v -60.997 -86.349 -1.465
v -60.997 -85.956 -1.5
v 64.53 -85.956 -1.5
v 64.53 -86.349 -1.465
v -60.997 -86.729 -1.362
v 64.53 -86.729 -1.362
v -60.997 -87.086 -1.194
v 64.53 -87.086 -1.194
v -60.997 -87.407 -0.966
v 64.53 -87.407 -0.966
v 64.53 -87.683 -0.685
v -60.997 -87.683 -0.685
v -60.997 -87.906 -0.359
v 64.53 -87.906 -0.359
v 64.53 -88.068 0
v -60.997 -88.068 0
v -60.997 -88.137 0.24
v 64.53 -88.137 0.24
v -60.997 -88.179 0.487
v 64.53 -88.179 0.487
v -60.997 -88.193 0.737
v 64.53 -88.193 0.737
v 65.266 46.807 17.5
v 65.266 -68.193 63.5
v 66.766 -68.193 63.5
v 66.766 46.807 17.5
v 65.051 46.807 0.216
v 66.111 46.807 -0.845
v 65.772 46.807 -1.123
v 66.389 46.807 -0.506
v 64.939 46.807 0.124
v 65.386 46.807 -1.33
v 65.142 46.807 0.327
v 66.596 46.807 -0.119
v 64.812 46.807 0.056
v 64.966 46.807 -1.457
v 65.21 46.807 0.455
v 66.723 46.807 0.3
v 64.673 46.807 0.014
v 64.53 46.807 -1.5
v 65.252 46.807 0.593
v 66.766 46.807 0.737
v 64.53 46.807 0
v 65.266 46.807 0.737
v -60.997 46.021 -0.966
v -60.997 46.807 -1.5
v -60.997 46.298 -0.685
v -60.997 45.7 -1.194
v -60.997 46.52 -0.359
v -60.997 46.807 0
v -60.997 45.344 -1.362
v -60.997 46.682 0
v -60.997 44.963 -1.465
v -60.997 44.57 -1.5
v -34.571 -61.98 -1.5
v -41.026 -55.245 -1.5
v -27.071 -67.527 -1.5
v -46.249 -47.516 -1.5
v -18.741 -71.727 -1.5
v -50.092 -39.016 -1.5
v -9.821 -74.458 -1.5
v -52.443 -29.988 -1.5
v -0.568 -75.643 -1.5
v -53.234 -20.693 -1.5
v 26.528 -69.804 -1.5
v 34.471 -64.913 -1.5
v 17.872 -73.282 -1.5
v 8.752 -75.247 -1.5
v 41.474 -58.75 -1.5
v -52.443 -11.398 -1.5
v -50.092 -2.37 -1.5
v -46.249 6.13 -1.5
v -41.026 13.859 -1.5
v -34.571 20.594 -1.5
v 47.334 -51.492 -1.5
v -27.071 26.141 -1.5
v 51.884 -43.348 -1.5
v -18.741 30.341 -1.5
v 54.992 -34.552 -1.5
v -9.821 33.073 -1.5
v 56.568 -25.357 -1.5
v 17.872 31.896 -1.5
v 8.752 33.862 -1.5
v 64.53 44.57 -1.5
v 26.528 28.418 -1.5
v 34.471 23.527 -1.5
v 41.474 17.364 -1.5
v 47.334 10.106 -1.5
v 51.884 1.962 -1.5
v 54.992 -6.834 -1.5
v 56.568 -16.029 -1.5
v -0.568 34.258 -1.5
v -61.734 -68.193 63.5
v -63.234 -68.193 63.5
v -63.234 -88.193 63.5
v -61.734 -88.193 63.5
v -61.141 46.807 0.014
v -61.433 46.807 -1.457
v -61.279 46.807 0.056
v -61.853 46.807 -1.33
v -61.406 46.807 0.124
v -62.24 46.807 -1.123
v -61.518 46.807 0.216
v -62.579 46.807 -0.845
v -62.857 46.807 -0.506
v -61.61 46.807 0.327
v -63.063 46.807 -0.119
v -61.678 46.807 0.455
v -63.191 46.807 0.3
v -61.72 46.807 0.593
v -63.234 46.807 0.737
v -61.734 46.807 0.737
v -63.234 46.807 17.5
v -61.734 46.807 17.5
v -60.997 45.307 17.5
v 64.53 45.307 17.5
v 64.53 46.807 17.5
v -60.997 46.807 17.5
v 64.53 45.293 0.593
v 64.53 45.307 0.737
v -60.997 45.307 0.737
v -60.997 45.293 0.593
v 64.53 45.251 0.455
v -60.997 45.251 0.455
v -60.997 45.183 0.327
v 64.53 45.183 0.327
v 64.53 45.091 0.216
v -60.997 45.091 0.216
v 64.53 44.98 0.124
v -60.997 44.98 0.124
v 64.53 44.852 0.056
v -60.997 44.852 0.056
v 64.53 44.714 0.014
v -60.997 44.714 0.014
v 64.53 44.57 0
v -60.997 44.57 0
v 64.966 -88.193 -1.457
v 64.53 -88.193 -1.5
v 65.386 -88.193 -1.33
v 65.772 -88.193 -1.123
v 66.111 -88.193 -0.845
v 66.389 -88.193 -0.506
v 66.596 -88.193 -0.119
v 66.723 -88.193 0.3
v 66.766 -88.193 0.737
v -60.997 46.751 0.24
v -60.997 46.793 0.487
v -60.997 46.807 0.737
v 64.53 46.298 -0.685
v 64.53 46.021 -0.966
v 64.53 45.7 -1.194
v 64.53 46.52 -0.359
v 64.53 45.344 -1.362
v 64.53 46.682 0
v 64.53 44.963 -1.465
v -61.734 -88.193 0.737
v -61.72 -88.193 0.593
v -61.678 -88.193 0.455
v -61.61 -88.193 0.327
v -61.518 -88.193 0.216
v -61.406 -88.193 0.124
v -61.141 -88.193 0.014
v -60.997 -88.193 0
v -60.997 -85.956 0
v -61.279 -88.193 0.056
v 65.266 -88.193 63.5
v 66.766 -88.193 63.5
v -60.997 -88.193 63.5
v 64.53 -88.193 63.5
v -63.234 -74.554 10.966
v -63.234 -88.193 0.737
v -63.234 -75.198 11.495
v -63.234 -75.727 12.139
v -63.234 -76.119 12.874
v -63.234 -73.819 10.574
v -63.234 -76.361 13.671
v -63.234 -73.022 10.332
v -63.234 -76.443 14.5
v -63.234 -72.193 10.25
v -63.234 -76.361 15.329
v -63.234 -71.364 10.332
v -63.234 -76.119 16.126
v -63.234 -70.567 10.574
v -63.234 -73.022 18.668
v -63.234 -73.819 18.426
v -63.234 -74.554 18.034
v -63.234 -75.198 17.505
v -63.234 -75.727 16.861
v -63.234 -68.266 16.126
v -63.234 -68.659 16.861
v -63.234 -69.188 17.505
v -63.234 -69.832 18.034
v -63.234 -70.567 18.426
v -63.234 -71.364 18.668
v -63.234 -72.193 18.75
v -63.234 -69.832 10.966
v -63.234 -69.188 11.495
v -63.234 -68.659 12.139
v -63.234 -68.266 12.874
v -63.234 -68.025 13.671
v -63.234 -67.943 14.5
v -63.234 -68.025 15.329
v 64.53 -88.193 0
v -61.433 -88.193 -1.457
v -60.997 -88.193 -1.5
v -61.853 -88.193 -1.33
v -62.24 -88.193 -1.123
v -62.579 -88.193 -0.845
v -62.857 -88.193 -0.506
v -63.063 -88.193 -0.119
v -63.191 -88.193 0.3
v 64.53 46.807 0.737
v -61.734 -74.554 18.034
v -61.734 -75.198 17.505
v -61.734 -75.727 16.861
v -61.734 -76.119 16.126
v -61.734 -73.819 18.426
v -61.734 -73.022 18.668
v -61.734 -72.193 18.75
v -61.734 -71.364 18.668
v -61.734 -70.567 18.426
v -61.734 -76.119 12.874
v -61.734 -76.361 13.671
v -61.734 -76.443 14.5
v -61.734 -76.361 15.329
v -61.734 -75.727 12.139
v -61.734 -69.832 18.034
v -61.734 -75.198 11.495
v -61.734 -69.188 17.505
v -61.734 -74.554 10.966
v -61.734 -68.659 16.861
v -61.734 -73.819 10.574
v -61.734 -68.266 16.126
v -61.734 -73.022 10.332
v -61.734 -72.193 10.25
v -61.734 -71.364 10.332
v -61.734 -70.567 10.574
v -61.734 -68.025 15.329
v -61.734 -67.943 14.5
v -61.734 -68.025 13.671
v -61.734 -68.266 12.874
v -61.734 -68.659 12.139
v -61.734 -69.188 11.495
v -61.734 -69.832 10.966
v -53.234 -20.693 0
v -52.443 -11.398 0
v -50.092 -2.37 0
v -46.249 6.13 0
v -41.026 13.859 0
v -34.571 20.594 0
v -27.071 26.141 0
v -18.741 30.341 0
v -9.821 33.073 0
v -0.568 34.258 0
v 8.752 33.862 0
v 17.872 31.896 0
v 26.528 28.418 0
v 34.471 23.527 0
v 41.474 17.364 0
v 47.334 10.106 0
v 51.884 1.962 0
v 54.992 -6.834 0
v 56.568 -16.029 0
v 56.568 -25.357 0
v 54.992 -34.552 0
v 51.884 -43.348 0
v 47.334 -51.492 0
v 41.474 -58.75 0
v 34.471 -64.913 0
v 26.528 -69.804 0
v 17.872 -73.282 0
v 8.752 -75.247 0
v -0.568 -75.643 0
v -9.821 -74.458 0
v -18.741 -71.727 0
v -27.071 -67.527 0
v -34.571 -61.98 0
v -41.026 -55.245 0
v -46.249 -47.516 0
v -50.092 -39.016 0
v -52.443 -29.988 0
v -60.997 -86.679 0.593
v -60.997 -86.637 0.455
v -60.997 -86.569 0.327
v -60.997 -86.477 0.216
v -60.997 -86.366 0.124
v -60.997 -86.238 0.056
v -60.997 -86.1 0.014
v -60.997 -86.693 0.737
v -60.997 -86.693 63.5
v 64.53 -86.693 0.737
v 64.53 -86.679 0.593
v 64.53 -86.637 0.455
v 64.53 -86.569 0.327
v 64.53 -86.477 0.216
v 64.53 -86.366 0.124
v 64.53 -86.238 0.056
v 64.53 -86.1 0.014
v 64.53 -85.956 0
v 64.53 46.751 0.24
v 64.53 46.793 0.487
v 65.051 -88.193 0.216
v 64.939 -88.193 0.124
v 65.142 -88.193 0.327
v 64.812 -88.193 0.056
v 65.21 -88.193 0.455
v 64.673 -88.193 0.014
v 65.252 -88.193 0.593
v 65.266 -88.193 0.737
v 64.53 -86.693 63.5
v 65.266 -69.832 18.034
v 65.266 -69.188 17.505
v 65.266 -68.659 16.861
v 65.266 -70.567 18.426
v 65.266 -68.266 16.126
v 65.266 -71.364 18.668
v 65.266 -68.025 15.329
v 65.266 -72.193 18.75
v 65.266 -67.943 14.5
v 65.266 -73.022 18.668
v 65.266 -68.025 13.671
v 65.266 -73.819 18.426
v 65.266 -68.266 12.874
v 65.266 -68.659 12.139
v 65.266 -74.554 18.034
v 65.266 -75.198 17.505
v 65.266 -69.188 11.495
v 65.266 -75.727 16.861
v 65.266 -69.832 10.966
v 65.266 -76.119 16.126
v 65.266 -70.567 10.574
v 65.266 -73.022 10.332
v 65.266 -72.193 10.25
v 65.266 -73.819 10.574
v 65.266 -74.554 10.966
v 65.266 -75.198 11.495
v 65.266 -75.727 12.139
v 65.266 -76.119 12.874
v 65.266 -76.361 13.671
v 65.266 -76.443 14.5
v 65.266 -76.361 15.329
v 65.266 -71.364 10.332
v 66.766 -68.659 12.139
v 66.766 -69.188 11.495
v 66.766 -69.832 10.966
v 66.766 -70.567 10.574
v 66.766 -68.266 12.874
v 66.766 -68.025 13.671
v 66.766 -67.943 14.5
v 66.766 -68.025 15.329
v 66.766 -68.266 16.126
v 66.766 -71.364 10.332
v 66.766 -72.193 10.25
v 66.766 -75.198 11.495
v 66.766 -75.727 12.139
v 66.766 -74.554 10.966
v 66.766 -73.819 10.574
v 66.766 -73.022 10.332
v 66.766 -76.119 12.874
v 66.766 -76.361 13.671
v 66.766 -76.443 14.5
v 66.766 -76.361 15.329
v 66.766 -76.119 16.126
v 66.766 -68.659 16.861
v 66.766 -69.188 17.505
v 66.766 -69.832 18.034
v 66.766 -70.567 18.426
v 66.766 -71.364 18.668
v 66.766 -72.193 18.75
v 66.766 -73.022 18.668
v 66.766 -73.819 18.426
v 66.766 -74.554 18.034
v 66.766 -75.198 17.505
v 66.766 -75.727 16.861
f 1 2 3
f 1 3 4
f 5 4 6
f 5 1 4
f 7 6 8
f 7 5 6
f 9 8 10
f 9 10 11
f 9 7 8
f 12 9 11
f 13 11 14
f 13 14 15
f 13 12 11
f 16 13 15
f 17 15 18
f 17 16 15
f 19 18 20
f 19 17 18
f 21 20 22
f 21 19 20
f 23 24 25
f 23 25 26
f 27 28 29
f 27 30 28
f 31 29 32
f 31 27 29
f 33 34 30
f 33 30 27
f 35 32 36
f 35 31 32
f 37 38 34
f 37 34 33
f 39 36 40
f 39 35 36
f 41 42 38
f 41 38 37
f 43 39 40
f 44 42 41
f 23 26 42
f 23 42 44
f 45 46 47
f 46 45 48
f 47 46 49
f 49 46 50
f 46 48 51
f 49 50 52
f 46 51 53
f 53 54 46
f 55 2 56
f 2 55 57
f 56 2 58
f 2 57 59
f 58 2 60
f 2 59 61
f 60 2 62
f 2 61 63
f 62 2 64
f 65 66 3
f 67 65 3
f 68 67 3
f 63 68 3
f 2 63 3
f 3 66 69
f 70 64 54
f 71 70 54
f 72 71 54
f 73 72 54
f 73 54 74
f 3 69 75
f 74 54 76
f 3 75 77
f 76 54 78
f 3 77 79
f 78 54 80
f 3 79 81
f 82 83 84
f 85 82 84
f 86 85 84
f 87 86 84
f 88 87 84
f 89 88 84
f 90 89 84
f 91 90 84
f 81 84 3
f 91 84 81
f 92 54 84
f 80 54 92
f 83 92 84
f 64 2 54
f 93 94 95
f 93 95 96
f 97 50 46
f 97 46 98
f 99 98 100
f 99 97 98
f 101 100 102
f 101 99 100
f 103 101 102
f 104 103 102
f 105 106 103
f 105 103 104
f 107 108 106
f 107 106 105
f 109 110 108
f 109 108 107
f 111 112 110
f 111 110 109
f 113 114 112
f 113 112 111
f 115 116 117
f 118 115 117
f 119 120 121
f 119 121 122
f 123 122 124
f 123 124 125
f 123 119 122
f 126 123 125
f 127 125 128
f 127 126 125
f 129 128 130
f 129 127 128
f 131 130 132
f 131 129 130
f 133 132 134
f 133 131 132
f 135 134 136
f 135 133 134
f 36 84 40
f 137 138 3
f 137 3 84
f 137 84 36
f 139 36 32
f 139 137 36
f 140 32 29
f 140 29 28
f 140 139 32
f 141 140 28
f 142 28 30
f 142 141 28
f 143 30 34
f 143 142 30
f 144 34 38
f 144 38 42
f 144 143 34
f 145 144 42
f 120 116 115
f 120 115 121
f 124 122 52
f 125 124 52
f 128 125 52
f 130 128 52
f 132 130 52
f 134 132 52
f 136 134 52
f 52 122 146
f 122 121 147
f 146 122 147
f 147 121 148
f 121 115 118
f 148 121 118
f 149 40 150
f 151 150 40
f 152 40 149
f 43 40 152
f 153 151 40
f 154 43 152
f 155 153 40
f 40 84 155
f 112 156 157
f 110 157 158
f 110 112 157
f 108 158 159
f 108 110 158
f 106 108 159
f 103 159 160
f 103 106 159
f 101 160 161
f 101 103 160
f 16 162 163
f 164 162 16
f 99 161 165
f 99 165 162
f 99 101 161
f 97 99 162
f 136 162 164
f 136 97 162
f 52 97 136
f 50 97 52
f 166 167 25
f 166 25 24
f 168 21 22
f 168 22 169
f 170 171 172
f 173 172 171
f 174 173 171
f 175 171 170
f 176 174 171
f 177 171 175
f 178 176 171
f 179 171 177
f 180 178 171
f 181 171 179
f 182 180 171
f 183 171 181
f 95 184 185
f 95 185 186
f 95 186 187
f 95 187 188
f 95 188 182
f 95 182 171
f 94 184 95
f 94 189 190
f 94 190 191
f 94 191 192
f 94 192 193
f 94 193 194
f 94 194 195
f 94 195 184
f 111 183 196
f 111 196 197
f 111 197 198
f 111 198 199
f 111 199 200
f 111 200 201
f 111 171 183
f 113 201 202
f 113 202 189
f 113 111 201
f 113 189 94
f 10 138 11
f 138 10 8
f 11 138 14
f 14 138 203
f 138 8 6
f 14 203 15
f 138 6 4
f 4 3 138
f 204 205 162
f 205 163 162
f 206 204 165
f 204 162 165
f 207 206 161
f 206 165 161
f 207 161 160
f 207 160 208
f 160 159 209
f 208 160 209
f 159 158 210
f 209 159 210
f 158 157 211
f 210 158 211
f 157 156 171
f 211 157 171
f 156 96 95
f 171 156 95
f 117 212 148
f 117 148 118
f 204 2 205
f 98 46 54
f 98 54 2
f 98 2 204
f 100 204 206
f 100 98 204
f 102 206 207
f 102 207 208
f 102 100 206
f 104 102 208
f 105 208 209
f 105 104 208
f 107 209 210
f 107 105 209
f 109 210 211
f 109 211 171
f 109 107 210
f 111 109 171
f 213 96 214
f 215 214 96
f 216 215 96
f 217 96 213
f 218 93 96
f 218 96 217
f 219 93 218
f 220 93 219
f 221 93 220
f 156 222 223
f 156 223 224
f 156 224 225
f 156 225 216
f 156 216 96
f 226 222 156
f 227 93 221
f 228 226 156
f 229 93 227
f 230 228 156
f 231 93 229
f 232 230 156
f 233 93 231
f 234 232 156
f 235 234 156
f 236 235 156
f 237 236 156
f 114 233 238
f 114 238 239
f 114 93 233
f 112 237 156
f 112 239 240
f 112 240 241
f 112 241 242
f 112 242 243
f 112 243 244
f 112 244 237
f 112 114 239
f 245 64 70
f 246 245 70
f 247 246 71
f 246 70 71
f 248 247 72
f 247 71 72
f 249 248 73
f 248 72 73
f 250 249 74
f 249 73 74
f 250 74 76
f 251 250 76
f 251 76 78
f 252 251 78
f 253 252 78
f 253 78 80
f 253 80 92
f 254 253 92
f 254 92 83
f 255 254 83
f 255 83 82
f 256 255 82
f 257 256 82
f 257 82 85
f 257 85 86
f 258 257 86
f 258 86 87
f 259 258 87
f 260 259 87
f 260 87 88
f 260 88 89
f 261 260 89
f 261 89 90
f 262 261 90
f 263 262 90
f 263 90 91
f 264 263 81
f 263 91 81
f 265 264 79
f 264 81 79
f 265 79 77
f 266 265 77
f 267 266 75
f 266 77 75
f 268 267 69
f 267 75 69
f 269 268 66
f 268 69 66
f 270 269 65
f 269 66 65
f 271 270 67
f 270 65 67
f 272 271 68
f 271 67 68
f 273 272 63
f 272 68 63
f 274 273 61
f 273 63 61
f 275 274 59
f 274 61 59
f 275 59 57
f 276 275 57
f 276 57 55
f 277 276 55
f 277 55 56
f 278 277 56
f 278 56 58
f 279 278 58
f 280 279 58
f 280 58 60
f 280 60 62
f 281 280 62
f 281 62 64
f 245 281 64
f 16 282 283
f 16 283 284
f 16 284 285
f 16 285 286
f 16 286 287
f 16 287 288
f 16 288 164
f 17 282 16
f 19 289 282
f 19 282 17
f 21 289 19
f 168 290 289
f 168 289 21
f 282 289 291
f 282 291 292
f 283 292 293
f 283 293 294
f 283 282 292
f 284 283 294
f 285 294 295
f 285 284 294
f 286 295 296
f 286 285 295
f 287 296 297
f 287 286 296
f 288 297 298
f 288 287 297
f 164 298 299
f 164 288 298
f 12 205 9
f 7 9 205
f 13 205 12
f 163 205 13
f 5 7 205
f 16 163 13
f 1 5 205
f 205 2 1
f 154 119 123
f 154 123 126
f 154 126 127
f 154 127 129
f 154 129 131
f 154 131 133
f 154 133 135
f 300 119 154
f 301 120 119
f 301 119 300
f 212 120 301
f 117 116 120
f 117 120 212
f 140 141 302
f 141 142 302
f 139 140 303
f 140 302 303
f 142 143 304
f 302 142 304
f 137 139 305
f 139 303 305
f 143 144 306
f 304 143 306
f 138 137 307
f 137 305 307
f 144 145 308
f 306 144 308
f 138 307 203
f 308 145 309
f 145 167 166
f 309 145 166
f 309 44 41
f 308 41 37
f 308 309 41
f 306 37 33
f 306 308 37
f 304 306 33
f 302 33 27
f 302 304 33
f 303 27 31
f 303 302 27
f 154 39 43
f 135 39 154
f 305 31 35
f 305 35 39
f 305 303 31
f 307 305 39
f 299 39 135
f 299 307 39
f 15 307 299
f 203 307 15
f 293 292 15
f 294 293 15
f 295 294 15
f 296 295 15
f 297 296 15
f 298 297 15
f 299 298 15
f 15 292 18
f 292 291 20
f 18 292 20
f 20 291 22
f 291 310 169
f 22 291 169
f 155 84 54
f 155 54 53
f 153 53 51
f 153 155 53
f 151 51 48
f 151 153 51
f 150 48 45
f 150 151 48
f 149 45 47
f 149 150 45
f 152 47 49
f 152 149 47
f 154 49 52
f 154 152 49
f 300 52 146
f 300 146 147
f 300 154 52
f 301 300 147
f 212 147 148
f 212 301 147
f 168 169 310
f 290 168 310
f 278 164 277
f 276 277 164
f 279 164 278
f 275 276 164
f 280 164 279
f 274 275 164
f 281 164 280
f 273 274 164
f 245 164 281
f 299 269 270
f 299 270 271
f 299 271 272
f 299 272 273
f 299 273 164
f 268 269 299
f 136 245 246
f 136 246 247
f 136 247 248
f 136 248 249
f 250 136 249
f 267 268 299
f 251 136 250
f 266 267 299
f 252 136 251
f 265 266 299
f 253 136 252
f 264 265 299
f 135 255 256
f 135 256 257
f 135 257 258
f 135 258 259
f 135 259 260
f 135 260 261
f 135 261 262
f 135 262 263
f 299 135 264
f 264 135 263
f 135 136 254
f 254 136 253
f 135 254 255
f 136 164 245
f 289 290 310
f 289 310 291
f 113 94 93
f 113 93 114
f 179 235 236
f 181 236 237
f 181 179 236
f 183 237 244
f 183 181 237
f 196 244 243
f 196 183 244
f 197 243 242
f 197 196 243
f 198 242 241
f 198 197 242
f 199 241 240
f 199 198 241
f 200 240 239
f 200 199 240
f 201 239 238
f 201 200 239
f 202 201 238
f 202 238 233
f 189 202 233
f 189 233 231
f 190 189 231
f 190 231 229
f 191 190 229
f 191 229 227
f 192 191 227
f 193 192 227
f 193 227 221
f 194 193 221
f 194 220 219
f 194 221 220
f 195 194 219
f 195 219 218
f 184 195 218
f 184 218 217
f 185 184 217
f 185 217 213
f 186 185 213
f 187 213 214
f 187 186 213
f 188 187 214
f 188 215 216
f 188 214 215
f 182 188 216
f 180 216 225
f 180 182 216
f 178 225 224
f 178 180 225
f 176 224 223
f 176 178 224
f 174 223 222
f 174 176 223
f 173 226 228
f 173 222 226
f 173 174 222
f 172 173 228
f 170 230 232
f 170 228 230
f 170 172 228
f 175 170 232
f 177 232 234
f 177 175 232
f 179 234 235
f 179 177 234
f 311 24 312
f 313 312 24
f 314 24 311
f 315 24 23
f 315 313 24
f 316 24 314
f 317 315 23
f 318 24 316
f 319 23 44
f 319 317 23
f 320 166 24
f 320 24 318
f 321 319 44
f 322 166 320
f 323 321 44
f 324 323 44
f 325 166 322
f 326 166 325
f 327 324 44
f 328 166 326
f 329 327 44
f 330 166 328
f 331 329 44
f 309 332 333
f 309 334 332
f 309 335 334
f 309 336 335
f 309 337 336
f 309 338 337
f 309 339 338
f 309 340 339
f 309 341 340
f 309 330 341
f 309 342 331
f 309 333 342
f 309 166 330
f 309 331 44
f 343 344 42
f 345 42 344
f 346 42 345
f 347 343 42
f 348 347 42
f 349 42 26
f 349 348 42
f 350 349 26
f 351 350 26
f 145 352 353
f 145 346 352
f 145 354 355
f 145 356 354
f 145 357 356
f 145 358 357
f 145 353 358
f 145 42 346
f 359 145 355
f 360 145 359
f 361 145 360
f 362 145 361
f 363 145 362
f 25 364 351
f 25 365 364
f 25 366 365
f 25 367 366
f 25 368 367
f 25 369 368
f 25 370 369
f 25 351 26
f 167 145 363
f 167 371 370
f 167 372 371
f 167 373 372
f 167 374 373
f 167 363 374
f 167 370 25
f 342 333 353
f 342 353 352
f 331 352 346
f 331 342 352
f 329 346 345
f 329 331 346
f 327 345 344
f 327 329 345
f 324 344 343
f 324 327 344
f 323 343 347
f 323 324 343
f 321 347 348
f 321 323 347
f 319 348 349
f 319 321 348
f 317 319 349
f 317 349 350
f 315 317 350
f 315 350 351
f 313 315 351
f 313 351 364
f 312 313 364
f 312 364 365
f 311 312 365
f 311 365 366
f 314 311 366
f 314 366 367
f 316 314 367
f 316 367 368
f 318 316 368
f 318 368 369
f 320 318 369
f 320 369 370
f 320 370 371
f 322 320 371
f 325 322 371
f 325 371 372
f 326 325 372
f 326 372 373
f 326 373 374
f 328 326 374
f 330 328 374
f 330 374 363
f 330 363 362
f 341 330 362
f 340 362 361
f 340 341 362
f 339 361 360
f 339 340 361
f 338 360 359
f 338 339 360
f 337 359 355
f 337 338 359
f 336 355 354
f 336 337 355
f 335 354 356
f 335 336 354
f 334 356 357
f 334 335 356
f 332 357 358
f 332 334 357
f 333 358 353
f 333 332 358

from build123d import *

# Parameters (mm, degrees)
SKETCH1_W                    = 130
SKETCH1_H                    = 135
BASE_FLANGE2_DEPTH           = 1.5
EDGE_FLANGE5_STRIP_W         = 7.4732
EDGE_FLANGE5_STRIP_H         = 1.5
EDGE_FLANGE5_STRIP_CUT_DEPTH = 135
EDGE_FLANGE5_DEPTH           = 135
EDGE_FLANGE6_STRIP_W         = 7.4732
EDGE_FLANGE6_STRIP_H         = 1.5
EDGE_FLANGE6_STRIP_CUT_DEPTH = 135
EDGE_FLANGE6_DEPTH           = 135
EDGE_FLANGE7_STRIP_W         = 7.4732
EDGE_FLANGE7_STRIP_H         = 1.5
EDGE_FLANGE7_STRIP_CUT_DEPTH = 125.5268
EDGE_FLANGE7_DEPTH           = 125.5268
CUT_EXTRUDE1_START           = -130
CUT_EXTRUDE1_OUTLINE_R       = 4.25
CUT_EXTRUDE1_DEPTH           = 130
CUT_EXTRUDE1_START_2         = -127.7634
CUT_EXTRUDE1_2_DEPTH         = 125.5268
SKETCH39_R                   = 55
CUT_EXTRUDE2_DEPTH           = 10
EDGE_FLANGE8_STRIP_W         = 7.4732
EDGE_FLANGE8_STRIP_H         = 1.5
EDGE_FLANGE8_STRIP_CUT_DEPTH = 125.5268
EDGE_FLANGE8_DEPTH           = 125.5268


# Read off the part's stored shape, not the designer's step: Cut-Extrude1
# Sheet-metal steps are written as plain solids
with BuildPart() as part:
    # Sketch1 → Base-Flange2 (new body)
    with BuildSketch(Plane.XY):
        with Locations((1.766304348, -20.692934783)):
            Rectangle(SKETCH1_W, SKETCH1_H)
    extrude(amount=-BASE_FLANGE2_DEPTH)

    # Edge-Flange5 strip (across the edge) → Edge-Flange5 strip cut (cut)
    with BuildSketch(Plane(origin=(66.766304348, -88.192934783, 0), x_dir=(-1, 0, 0), z_dir=(0, 1, 0))):
        with Locations((-1.5, -0.75)):
            Rectangle(EDGE_FLANGE5_STRIP_W, EDGE_FLANGE5_STRIP_H)
    extrude(amount=EDGE_FLANGE5_STRIP_CUT_DEPTH, mode=Mode.SUBTRACT)

    # Edge-Flange5 section (across the edge) → Edge-Flange5 (add)
    with BuildSketch(Plane(origin=(66.766304348, -88.192934783, 0), x_dir=(-1, 0, 0), z_dir=(0, 1, 0))):
        with BuildLine():
            Line((0, 0.7366), (0, 63.5))
            Line((0, 63.5), (1.5, 63.5))
            Line((1.5, 63.5), (1.5, 0.7366))
            ThreePointArc((1.5, 0.7366), (1.715745145, 0.215745145), (2.2366, 0))
            Line((2.2366, 0), (2.2366, -1.5))
            ThreePointArc((2.2366, -1.5), (0.655084973, -0.844915027), (0, 0.7366))
        make_face()
    extrude(amount=EDGE_FLANGE5_DEPTH)

    # Edge-Flange6 strip (across the edge) → Edge-Flange6 strip cut (cut)
    with BuildSketch(Plane(origin=(-63.233695652, 46.807065217, 0), x_dir=(1, 0, 0), z_dir=(0, -1, 0))):
        with Locations((-1.5, -0.75)):
            Rectangle(EDGE_FLANGE6_STRIP_W, EDGE_FLANGE6_STRIP_H)
    extrude(amount=EDGE_FLANGE6_STRIP_CUT_DEPTH, mode=Mode.SUBTRACT)

    # Edge-Flange6 section (across the edge) → Edge-Flange6 (add)
    with BuildSketch(Plane(origin=(-63.233695652, 46.807065217, 0), x_dir=(1, 0, 0), z_dir=(0, -1, 0))):
        with BuildLine():
            Line((0, 0.7366), (0, 63.5))
            Line((0, 63.5), (1.5, 63.5))
            Line((1.5, 63.5), (1.5, 0.7366))
            ThreePointArc((1.5, 0.7366), (1.715745145, 0.215745145), (2.2366, 0))
            Line((2.2366, 0), (2.2366, -1.5))
            ThreePointArc((2.2366, -1.5), (0.655084973, -0.844915027), (0, 0.7366))
        make_face()
    extrude(amount=EDGE_FLANGE6_DEPTH)

    # Edge-Flange7 strip (across the edge) → Edge-Flange7 strip cut (cut)
    with BuildSketch(Plane(origin=(64.529704348, 46.807065217, 0), x_dir=(0, -1, 0), z_dir=(-1, 0, 0))):
        with Locations((-1.5, -0.75)):
            Rectangle(EDGE_FLANGE7_STRIP_W, EDGE_FLANGE7_STRIP_H)
    extrude(amount=EDGE_FLANGE7_STRIP_CUT_DEPTH, mode=Mode.SUBTRACT)

    # Edge-Flange7 section (across the edge) → Edge-Flange7 (add)
    with BuildSketch(Plane(origin=(64.529704348, 46.807065217, 0), x_dir=(0, -1, 0), z_dir=(-1, 0, 0))):
        with BuildLine():
            Line((0, 0.7366), (0, 22.5))
            Line((0, 22.5), (1.5, 22.5))
            Line((1.5, 22.5), (1.5, 0.7366))
            ThreePointArc((1.5, 0.7366), (1.715745145, 0.215745145), (2.2366, 0))
            Line((2.2366, 0), (2.2366, -1.5))
            ThreePointArc((2.2366, -1.5), (0.655084973, -0.844915027), (0, 0.7366))
        make_face()
    extrude(amount=EDGE_FLANGE7_DEPTH)

    # Cut-Extrude1 outline → Cut-Extrude1 (cut)
    with BuildSketch(Plane(origin=(66.766304348, 0, 0), x_dir=(0, 0, -1), z_dir=(1, 0, 0)).offset(CUT_EXTRUDE1_START)):
        with Locations((-14.5, -72.192934783)):
            Circle(CUT_EXTRUDE1_OUTLINE_R)
        Polygon((-17.5, 46.807065217), (-63.5, 46.807065217), (-63.5, -68.192934783), align=None)
    extrude(amount=CUT_EXTRUDE1_DEPTH, mode=Mode.SUBTRACT)

    # Cut-Extrude1 2 outline → Cut-Extrude1 2 (cut)
    with BuildSketch(Plane(origin=(66.766304348, 0, 0), x_dir=(0, 0, -1), z_dir=(1, 0, 0)).offset(CUT_EXTRUDE1_START_2)):
        Polygon((-17.5, 45.307065217), (-17.5, 46.807065217), (-18.1, 45.307065217), align=None)
    extrude(amount=CUT_EXTRUDE1_2_DEPTH, mode=Mode.SUBTRACT)

    # Sketch39 → Cut-Extrude2 (cut)
    with BuildSketch(Plane(origin=(0, 0, -1.5), x_dir=(-1, 0, 0), z_dir=(0, 0, -1))):
        with Locations((-1.766304348, -20.692934783)):
            Circle(SKETCH39_R)
    extrude(amount=-CUT_EXTRUDE2_DEPTH, mode=Mode.SUBTRACT)

    # Edge-Flange8 strip (across the edge) → Edge-Flange8 strip cut (cut)
    with BuildSketch(Plane(origin=(-60.997095652, -88.192934783, 0), x_dir=(0, 1, 0), z_dir=(1, 0, 0))):
        with Locations((-1.5, -0.75)):
            Rectangle(EDGE_FLANGE8_STRIP_W, EDGE_FLANGE8_STRIP_H)
    extrude(amount=EDGE_FLANGE8_STRIP_CUT_DEPTH, mode=Mode.SUBTRACT)

    # Edge-Flange8 section (across the edge) → Edge-Flange8 (add)
    with BuildSketch(Plane(origin=(-60.997095652, -88.192934783, 0), x_dir=(0, 1, 0), z_dir=(1, 0, 0))):
        with BuildLine():
            Line((0, 0.7366), (0, 63.5))
            Line((0, 63.5), (1.5, 63.5))
            Line((1.5, 63.5), (1.5, 0.7366))
            ThreePointArc((1.5, 0.7366), (1.715745145, 0.215745145), (2.2366, 0))
            Line((2.2366, 0), (2.2366, -1.5))
            ThreePointArc((2.2366, -1.5), (0.655084973, -0.844915027), (0, 0.7366))
        make_face()
    extrude(amount=EDGE_FLANGE8_DEPTH)


solid = part.part
